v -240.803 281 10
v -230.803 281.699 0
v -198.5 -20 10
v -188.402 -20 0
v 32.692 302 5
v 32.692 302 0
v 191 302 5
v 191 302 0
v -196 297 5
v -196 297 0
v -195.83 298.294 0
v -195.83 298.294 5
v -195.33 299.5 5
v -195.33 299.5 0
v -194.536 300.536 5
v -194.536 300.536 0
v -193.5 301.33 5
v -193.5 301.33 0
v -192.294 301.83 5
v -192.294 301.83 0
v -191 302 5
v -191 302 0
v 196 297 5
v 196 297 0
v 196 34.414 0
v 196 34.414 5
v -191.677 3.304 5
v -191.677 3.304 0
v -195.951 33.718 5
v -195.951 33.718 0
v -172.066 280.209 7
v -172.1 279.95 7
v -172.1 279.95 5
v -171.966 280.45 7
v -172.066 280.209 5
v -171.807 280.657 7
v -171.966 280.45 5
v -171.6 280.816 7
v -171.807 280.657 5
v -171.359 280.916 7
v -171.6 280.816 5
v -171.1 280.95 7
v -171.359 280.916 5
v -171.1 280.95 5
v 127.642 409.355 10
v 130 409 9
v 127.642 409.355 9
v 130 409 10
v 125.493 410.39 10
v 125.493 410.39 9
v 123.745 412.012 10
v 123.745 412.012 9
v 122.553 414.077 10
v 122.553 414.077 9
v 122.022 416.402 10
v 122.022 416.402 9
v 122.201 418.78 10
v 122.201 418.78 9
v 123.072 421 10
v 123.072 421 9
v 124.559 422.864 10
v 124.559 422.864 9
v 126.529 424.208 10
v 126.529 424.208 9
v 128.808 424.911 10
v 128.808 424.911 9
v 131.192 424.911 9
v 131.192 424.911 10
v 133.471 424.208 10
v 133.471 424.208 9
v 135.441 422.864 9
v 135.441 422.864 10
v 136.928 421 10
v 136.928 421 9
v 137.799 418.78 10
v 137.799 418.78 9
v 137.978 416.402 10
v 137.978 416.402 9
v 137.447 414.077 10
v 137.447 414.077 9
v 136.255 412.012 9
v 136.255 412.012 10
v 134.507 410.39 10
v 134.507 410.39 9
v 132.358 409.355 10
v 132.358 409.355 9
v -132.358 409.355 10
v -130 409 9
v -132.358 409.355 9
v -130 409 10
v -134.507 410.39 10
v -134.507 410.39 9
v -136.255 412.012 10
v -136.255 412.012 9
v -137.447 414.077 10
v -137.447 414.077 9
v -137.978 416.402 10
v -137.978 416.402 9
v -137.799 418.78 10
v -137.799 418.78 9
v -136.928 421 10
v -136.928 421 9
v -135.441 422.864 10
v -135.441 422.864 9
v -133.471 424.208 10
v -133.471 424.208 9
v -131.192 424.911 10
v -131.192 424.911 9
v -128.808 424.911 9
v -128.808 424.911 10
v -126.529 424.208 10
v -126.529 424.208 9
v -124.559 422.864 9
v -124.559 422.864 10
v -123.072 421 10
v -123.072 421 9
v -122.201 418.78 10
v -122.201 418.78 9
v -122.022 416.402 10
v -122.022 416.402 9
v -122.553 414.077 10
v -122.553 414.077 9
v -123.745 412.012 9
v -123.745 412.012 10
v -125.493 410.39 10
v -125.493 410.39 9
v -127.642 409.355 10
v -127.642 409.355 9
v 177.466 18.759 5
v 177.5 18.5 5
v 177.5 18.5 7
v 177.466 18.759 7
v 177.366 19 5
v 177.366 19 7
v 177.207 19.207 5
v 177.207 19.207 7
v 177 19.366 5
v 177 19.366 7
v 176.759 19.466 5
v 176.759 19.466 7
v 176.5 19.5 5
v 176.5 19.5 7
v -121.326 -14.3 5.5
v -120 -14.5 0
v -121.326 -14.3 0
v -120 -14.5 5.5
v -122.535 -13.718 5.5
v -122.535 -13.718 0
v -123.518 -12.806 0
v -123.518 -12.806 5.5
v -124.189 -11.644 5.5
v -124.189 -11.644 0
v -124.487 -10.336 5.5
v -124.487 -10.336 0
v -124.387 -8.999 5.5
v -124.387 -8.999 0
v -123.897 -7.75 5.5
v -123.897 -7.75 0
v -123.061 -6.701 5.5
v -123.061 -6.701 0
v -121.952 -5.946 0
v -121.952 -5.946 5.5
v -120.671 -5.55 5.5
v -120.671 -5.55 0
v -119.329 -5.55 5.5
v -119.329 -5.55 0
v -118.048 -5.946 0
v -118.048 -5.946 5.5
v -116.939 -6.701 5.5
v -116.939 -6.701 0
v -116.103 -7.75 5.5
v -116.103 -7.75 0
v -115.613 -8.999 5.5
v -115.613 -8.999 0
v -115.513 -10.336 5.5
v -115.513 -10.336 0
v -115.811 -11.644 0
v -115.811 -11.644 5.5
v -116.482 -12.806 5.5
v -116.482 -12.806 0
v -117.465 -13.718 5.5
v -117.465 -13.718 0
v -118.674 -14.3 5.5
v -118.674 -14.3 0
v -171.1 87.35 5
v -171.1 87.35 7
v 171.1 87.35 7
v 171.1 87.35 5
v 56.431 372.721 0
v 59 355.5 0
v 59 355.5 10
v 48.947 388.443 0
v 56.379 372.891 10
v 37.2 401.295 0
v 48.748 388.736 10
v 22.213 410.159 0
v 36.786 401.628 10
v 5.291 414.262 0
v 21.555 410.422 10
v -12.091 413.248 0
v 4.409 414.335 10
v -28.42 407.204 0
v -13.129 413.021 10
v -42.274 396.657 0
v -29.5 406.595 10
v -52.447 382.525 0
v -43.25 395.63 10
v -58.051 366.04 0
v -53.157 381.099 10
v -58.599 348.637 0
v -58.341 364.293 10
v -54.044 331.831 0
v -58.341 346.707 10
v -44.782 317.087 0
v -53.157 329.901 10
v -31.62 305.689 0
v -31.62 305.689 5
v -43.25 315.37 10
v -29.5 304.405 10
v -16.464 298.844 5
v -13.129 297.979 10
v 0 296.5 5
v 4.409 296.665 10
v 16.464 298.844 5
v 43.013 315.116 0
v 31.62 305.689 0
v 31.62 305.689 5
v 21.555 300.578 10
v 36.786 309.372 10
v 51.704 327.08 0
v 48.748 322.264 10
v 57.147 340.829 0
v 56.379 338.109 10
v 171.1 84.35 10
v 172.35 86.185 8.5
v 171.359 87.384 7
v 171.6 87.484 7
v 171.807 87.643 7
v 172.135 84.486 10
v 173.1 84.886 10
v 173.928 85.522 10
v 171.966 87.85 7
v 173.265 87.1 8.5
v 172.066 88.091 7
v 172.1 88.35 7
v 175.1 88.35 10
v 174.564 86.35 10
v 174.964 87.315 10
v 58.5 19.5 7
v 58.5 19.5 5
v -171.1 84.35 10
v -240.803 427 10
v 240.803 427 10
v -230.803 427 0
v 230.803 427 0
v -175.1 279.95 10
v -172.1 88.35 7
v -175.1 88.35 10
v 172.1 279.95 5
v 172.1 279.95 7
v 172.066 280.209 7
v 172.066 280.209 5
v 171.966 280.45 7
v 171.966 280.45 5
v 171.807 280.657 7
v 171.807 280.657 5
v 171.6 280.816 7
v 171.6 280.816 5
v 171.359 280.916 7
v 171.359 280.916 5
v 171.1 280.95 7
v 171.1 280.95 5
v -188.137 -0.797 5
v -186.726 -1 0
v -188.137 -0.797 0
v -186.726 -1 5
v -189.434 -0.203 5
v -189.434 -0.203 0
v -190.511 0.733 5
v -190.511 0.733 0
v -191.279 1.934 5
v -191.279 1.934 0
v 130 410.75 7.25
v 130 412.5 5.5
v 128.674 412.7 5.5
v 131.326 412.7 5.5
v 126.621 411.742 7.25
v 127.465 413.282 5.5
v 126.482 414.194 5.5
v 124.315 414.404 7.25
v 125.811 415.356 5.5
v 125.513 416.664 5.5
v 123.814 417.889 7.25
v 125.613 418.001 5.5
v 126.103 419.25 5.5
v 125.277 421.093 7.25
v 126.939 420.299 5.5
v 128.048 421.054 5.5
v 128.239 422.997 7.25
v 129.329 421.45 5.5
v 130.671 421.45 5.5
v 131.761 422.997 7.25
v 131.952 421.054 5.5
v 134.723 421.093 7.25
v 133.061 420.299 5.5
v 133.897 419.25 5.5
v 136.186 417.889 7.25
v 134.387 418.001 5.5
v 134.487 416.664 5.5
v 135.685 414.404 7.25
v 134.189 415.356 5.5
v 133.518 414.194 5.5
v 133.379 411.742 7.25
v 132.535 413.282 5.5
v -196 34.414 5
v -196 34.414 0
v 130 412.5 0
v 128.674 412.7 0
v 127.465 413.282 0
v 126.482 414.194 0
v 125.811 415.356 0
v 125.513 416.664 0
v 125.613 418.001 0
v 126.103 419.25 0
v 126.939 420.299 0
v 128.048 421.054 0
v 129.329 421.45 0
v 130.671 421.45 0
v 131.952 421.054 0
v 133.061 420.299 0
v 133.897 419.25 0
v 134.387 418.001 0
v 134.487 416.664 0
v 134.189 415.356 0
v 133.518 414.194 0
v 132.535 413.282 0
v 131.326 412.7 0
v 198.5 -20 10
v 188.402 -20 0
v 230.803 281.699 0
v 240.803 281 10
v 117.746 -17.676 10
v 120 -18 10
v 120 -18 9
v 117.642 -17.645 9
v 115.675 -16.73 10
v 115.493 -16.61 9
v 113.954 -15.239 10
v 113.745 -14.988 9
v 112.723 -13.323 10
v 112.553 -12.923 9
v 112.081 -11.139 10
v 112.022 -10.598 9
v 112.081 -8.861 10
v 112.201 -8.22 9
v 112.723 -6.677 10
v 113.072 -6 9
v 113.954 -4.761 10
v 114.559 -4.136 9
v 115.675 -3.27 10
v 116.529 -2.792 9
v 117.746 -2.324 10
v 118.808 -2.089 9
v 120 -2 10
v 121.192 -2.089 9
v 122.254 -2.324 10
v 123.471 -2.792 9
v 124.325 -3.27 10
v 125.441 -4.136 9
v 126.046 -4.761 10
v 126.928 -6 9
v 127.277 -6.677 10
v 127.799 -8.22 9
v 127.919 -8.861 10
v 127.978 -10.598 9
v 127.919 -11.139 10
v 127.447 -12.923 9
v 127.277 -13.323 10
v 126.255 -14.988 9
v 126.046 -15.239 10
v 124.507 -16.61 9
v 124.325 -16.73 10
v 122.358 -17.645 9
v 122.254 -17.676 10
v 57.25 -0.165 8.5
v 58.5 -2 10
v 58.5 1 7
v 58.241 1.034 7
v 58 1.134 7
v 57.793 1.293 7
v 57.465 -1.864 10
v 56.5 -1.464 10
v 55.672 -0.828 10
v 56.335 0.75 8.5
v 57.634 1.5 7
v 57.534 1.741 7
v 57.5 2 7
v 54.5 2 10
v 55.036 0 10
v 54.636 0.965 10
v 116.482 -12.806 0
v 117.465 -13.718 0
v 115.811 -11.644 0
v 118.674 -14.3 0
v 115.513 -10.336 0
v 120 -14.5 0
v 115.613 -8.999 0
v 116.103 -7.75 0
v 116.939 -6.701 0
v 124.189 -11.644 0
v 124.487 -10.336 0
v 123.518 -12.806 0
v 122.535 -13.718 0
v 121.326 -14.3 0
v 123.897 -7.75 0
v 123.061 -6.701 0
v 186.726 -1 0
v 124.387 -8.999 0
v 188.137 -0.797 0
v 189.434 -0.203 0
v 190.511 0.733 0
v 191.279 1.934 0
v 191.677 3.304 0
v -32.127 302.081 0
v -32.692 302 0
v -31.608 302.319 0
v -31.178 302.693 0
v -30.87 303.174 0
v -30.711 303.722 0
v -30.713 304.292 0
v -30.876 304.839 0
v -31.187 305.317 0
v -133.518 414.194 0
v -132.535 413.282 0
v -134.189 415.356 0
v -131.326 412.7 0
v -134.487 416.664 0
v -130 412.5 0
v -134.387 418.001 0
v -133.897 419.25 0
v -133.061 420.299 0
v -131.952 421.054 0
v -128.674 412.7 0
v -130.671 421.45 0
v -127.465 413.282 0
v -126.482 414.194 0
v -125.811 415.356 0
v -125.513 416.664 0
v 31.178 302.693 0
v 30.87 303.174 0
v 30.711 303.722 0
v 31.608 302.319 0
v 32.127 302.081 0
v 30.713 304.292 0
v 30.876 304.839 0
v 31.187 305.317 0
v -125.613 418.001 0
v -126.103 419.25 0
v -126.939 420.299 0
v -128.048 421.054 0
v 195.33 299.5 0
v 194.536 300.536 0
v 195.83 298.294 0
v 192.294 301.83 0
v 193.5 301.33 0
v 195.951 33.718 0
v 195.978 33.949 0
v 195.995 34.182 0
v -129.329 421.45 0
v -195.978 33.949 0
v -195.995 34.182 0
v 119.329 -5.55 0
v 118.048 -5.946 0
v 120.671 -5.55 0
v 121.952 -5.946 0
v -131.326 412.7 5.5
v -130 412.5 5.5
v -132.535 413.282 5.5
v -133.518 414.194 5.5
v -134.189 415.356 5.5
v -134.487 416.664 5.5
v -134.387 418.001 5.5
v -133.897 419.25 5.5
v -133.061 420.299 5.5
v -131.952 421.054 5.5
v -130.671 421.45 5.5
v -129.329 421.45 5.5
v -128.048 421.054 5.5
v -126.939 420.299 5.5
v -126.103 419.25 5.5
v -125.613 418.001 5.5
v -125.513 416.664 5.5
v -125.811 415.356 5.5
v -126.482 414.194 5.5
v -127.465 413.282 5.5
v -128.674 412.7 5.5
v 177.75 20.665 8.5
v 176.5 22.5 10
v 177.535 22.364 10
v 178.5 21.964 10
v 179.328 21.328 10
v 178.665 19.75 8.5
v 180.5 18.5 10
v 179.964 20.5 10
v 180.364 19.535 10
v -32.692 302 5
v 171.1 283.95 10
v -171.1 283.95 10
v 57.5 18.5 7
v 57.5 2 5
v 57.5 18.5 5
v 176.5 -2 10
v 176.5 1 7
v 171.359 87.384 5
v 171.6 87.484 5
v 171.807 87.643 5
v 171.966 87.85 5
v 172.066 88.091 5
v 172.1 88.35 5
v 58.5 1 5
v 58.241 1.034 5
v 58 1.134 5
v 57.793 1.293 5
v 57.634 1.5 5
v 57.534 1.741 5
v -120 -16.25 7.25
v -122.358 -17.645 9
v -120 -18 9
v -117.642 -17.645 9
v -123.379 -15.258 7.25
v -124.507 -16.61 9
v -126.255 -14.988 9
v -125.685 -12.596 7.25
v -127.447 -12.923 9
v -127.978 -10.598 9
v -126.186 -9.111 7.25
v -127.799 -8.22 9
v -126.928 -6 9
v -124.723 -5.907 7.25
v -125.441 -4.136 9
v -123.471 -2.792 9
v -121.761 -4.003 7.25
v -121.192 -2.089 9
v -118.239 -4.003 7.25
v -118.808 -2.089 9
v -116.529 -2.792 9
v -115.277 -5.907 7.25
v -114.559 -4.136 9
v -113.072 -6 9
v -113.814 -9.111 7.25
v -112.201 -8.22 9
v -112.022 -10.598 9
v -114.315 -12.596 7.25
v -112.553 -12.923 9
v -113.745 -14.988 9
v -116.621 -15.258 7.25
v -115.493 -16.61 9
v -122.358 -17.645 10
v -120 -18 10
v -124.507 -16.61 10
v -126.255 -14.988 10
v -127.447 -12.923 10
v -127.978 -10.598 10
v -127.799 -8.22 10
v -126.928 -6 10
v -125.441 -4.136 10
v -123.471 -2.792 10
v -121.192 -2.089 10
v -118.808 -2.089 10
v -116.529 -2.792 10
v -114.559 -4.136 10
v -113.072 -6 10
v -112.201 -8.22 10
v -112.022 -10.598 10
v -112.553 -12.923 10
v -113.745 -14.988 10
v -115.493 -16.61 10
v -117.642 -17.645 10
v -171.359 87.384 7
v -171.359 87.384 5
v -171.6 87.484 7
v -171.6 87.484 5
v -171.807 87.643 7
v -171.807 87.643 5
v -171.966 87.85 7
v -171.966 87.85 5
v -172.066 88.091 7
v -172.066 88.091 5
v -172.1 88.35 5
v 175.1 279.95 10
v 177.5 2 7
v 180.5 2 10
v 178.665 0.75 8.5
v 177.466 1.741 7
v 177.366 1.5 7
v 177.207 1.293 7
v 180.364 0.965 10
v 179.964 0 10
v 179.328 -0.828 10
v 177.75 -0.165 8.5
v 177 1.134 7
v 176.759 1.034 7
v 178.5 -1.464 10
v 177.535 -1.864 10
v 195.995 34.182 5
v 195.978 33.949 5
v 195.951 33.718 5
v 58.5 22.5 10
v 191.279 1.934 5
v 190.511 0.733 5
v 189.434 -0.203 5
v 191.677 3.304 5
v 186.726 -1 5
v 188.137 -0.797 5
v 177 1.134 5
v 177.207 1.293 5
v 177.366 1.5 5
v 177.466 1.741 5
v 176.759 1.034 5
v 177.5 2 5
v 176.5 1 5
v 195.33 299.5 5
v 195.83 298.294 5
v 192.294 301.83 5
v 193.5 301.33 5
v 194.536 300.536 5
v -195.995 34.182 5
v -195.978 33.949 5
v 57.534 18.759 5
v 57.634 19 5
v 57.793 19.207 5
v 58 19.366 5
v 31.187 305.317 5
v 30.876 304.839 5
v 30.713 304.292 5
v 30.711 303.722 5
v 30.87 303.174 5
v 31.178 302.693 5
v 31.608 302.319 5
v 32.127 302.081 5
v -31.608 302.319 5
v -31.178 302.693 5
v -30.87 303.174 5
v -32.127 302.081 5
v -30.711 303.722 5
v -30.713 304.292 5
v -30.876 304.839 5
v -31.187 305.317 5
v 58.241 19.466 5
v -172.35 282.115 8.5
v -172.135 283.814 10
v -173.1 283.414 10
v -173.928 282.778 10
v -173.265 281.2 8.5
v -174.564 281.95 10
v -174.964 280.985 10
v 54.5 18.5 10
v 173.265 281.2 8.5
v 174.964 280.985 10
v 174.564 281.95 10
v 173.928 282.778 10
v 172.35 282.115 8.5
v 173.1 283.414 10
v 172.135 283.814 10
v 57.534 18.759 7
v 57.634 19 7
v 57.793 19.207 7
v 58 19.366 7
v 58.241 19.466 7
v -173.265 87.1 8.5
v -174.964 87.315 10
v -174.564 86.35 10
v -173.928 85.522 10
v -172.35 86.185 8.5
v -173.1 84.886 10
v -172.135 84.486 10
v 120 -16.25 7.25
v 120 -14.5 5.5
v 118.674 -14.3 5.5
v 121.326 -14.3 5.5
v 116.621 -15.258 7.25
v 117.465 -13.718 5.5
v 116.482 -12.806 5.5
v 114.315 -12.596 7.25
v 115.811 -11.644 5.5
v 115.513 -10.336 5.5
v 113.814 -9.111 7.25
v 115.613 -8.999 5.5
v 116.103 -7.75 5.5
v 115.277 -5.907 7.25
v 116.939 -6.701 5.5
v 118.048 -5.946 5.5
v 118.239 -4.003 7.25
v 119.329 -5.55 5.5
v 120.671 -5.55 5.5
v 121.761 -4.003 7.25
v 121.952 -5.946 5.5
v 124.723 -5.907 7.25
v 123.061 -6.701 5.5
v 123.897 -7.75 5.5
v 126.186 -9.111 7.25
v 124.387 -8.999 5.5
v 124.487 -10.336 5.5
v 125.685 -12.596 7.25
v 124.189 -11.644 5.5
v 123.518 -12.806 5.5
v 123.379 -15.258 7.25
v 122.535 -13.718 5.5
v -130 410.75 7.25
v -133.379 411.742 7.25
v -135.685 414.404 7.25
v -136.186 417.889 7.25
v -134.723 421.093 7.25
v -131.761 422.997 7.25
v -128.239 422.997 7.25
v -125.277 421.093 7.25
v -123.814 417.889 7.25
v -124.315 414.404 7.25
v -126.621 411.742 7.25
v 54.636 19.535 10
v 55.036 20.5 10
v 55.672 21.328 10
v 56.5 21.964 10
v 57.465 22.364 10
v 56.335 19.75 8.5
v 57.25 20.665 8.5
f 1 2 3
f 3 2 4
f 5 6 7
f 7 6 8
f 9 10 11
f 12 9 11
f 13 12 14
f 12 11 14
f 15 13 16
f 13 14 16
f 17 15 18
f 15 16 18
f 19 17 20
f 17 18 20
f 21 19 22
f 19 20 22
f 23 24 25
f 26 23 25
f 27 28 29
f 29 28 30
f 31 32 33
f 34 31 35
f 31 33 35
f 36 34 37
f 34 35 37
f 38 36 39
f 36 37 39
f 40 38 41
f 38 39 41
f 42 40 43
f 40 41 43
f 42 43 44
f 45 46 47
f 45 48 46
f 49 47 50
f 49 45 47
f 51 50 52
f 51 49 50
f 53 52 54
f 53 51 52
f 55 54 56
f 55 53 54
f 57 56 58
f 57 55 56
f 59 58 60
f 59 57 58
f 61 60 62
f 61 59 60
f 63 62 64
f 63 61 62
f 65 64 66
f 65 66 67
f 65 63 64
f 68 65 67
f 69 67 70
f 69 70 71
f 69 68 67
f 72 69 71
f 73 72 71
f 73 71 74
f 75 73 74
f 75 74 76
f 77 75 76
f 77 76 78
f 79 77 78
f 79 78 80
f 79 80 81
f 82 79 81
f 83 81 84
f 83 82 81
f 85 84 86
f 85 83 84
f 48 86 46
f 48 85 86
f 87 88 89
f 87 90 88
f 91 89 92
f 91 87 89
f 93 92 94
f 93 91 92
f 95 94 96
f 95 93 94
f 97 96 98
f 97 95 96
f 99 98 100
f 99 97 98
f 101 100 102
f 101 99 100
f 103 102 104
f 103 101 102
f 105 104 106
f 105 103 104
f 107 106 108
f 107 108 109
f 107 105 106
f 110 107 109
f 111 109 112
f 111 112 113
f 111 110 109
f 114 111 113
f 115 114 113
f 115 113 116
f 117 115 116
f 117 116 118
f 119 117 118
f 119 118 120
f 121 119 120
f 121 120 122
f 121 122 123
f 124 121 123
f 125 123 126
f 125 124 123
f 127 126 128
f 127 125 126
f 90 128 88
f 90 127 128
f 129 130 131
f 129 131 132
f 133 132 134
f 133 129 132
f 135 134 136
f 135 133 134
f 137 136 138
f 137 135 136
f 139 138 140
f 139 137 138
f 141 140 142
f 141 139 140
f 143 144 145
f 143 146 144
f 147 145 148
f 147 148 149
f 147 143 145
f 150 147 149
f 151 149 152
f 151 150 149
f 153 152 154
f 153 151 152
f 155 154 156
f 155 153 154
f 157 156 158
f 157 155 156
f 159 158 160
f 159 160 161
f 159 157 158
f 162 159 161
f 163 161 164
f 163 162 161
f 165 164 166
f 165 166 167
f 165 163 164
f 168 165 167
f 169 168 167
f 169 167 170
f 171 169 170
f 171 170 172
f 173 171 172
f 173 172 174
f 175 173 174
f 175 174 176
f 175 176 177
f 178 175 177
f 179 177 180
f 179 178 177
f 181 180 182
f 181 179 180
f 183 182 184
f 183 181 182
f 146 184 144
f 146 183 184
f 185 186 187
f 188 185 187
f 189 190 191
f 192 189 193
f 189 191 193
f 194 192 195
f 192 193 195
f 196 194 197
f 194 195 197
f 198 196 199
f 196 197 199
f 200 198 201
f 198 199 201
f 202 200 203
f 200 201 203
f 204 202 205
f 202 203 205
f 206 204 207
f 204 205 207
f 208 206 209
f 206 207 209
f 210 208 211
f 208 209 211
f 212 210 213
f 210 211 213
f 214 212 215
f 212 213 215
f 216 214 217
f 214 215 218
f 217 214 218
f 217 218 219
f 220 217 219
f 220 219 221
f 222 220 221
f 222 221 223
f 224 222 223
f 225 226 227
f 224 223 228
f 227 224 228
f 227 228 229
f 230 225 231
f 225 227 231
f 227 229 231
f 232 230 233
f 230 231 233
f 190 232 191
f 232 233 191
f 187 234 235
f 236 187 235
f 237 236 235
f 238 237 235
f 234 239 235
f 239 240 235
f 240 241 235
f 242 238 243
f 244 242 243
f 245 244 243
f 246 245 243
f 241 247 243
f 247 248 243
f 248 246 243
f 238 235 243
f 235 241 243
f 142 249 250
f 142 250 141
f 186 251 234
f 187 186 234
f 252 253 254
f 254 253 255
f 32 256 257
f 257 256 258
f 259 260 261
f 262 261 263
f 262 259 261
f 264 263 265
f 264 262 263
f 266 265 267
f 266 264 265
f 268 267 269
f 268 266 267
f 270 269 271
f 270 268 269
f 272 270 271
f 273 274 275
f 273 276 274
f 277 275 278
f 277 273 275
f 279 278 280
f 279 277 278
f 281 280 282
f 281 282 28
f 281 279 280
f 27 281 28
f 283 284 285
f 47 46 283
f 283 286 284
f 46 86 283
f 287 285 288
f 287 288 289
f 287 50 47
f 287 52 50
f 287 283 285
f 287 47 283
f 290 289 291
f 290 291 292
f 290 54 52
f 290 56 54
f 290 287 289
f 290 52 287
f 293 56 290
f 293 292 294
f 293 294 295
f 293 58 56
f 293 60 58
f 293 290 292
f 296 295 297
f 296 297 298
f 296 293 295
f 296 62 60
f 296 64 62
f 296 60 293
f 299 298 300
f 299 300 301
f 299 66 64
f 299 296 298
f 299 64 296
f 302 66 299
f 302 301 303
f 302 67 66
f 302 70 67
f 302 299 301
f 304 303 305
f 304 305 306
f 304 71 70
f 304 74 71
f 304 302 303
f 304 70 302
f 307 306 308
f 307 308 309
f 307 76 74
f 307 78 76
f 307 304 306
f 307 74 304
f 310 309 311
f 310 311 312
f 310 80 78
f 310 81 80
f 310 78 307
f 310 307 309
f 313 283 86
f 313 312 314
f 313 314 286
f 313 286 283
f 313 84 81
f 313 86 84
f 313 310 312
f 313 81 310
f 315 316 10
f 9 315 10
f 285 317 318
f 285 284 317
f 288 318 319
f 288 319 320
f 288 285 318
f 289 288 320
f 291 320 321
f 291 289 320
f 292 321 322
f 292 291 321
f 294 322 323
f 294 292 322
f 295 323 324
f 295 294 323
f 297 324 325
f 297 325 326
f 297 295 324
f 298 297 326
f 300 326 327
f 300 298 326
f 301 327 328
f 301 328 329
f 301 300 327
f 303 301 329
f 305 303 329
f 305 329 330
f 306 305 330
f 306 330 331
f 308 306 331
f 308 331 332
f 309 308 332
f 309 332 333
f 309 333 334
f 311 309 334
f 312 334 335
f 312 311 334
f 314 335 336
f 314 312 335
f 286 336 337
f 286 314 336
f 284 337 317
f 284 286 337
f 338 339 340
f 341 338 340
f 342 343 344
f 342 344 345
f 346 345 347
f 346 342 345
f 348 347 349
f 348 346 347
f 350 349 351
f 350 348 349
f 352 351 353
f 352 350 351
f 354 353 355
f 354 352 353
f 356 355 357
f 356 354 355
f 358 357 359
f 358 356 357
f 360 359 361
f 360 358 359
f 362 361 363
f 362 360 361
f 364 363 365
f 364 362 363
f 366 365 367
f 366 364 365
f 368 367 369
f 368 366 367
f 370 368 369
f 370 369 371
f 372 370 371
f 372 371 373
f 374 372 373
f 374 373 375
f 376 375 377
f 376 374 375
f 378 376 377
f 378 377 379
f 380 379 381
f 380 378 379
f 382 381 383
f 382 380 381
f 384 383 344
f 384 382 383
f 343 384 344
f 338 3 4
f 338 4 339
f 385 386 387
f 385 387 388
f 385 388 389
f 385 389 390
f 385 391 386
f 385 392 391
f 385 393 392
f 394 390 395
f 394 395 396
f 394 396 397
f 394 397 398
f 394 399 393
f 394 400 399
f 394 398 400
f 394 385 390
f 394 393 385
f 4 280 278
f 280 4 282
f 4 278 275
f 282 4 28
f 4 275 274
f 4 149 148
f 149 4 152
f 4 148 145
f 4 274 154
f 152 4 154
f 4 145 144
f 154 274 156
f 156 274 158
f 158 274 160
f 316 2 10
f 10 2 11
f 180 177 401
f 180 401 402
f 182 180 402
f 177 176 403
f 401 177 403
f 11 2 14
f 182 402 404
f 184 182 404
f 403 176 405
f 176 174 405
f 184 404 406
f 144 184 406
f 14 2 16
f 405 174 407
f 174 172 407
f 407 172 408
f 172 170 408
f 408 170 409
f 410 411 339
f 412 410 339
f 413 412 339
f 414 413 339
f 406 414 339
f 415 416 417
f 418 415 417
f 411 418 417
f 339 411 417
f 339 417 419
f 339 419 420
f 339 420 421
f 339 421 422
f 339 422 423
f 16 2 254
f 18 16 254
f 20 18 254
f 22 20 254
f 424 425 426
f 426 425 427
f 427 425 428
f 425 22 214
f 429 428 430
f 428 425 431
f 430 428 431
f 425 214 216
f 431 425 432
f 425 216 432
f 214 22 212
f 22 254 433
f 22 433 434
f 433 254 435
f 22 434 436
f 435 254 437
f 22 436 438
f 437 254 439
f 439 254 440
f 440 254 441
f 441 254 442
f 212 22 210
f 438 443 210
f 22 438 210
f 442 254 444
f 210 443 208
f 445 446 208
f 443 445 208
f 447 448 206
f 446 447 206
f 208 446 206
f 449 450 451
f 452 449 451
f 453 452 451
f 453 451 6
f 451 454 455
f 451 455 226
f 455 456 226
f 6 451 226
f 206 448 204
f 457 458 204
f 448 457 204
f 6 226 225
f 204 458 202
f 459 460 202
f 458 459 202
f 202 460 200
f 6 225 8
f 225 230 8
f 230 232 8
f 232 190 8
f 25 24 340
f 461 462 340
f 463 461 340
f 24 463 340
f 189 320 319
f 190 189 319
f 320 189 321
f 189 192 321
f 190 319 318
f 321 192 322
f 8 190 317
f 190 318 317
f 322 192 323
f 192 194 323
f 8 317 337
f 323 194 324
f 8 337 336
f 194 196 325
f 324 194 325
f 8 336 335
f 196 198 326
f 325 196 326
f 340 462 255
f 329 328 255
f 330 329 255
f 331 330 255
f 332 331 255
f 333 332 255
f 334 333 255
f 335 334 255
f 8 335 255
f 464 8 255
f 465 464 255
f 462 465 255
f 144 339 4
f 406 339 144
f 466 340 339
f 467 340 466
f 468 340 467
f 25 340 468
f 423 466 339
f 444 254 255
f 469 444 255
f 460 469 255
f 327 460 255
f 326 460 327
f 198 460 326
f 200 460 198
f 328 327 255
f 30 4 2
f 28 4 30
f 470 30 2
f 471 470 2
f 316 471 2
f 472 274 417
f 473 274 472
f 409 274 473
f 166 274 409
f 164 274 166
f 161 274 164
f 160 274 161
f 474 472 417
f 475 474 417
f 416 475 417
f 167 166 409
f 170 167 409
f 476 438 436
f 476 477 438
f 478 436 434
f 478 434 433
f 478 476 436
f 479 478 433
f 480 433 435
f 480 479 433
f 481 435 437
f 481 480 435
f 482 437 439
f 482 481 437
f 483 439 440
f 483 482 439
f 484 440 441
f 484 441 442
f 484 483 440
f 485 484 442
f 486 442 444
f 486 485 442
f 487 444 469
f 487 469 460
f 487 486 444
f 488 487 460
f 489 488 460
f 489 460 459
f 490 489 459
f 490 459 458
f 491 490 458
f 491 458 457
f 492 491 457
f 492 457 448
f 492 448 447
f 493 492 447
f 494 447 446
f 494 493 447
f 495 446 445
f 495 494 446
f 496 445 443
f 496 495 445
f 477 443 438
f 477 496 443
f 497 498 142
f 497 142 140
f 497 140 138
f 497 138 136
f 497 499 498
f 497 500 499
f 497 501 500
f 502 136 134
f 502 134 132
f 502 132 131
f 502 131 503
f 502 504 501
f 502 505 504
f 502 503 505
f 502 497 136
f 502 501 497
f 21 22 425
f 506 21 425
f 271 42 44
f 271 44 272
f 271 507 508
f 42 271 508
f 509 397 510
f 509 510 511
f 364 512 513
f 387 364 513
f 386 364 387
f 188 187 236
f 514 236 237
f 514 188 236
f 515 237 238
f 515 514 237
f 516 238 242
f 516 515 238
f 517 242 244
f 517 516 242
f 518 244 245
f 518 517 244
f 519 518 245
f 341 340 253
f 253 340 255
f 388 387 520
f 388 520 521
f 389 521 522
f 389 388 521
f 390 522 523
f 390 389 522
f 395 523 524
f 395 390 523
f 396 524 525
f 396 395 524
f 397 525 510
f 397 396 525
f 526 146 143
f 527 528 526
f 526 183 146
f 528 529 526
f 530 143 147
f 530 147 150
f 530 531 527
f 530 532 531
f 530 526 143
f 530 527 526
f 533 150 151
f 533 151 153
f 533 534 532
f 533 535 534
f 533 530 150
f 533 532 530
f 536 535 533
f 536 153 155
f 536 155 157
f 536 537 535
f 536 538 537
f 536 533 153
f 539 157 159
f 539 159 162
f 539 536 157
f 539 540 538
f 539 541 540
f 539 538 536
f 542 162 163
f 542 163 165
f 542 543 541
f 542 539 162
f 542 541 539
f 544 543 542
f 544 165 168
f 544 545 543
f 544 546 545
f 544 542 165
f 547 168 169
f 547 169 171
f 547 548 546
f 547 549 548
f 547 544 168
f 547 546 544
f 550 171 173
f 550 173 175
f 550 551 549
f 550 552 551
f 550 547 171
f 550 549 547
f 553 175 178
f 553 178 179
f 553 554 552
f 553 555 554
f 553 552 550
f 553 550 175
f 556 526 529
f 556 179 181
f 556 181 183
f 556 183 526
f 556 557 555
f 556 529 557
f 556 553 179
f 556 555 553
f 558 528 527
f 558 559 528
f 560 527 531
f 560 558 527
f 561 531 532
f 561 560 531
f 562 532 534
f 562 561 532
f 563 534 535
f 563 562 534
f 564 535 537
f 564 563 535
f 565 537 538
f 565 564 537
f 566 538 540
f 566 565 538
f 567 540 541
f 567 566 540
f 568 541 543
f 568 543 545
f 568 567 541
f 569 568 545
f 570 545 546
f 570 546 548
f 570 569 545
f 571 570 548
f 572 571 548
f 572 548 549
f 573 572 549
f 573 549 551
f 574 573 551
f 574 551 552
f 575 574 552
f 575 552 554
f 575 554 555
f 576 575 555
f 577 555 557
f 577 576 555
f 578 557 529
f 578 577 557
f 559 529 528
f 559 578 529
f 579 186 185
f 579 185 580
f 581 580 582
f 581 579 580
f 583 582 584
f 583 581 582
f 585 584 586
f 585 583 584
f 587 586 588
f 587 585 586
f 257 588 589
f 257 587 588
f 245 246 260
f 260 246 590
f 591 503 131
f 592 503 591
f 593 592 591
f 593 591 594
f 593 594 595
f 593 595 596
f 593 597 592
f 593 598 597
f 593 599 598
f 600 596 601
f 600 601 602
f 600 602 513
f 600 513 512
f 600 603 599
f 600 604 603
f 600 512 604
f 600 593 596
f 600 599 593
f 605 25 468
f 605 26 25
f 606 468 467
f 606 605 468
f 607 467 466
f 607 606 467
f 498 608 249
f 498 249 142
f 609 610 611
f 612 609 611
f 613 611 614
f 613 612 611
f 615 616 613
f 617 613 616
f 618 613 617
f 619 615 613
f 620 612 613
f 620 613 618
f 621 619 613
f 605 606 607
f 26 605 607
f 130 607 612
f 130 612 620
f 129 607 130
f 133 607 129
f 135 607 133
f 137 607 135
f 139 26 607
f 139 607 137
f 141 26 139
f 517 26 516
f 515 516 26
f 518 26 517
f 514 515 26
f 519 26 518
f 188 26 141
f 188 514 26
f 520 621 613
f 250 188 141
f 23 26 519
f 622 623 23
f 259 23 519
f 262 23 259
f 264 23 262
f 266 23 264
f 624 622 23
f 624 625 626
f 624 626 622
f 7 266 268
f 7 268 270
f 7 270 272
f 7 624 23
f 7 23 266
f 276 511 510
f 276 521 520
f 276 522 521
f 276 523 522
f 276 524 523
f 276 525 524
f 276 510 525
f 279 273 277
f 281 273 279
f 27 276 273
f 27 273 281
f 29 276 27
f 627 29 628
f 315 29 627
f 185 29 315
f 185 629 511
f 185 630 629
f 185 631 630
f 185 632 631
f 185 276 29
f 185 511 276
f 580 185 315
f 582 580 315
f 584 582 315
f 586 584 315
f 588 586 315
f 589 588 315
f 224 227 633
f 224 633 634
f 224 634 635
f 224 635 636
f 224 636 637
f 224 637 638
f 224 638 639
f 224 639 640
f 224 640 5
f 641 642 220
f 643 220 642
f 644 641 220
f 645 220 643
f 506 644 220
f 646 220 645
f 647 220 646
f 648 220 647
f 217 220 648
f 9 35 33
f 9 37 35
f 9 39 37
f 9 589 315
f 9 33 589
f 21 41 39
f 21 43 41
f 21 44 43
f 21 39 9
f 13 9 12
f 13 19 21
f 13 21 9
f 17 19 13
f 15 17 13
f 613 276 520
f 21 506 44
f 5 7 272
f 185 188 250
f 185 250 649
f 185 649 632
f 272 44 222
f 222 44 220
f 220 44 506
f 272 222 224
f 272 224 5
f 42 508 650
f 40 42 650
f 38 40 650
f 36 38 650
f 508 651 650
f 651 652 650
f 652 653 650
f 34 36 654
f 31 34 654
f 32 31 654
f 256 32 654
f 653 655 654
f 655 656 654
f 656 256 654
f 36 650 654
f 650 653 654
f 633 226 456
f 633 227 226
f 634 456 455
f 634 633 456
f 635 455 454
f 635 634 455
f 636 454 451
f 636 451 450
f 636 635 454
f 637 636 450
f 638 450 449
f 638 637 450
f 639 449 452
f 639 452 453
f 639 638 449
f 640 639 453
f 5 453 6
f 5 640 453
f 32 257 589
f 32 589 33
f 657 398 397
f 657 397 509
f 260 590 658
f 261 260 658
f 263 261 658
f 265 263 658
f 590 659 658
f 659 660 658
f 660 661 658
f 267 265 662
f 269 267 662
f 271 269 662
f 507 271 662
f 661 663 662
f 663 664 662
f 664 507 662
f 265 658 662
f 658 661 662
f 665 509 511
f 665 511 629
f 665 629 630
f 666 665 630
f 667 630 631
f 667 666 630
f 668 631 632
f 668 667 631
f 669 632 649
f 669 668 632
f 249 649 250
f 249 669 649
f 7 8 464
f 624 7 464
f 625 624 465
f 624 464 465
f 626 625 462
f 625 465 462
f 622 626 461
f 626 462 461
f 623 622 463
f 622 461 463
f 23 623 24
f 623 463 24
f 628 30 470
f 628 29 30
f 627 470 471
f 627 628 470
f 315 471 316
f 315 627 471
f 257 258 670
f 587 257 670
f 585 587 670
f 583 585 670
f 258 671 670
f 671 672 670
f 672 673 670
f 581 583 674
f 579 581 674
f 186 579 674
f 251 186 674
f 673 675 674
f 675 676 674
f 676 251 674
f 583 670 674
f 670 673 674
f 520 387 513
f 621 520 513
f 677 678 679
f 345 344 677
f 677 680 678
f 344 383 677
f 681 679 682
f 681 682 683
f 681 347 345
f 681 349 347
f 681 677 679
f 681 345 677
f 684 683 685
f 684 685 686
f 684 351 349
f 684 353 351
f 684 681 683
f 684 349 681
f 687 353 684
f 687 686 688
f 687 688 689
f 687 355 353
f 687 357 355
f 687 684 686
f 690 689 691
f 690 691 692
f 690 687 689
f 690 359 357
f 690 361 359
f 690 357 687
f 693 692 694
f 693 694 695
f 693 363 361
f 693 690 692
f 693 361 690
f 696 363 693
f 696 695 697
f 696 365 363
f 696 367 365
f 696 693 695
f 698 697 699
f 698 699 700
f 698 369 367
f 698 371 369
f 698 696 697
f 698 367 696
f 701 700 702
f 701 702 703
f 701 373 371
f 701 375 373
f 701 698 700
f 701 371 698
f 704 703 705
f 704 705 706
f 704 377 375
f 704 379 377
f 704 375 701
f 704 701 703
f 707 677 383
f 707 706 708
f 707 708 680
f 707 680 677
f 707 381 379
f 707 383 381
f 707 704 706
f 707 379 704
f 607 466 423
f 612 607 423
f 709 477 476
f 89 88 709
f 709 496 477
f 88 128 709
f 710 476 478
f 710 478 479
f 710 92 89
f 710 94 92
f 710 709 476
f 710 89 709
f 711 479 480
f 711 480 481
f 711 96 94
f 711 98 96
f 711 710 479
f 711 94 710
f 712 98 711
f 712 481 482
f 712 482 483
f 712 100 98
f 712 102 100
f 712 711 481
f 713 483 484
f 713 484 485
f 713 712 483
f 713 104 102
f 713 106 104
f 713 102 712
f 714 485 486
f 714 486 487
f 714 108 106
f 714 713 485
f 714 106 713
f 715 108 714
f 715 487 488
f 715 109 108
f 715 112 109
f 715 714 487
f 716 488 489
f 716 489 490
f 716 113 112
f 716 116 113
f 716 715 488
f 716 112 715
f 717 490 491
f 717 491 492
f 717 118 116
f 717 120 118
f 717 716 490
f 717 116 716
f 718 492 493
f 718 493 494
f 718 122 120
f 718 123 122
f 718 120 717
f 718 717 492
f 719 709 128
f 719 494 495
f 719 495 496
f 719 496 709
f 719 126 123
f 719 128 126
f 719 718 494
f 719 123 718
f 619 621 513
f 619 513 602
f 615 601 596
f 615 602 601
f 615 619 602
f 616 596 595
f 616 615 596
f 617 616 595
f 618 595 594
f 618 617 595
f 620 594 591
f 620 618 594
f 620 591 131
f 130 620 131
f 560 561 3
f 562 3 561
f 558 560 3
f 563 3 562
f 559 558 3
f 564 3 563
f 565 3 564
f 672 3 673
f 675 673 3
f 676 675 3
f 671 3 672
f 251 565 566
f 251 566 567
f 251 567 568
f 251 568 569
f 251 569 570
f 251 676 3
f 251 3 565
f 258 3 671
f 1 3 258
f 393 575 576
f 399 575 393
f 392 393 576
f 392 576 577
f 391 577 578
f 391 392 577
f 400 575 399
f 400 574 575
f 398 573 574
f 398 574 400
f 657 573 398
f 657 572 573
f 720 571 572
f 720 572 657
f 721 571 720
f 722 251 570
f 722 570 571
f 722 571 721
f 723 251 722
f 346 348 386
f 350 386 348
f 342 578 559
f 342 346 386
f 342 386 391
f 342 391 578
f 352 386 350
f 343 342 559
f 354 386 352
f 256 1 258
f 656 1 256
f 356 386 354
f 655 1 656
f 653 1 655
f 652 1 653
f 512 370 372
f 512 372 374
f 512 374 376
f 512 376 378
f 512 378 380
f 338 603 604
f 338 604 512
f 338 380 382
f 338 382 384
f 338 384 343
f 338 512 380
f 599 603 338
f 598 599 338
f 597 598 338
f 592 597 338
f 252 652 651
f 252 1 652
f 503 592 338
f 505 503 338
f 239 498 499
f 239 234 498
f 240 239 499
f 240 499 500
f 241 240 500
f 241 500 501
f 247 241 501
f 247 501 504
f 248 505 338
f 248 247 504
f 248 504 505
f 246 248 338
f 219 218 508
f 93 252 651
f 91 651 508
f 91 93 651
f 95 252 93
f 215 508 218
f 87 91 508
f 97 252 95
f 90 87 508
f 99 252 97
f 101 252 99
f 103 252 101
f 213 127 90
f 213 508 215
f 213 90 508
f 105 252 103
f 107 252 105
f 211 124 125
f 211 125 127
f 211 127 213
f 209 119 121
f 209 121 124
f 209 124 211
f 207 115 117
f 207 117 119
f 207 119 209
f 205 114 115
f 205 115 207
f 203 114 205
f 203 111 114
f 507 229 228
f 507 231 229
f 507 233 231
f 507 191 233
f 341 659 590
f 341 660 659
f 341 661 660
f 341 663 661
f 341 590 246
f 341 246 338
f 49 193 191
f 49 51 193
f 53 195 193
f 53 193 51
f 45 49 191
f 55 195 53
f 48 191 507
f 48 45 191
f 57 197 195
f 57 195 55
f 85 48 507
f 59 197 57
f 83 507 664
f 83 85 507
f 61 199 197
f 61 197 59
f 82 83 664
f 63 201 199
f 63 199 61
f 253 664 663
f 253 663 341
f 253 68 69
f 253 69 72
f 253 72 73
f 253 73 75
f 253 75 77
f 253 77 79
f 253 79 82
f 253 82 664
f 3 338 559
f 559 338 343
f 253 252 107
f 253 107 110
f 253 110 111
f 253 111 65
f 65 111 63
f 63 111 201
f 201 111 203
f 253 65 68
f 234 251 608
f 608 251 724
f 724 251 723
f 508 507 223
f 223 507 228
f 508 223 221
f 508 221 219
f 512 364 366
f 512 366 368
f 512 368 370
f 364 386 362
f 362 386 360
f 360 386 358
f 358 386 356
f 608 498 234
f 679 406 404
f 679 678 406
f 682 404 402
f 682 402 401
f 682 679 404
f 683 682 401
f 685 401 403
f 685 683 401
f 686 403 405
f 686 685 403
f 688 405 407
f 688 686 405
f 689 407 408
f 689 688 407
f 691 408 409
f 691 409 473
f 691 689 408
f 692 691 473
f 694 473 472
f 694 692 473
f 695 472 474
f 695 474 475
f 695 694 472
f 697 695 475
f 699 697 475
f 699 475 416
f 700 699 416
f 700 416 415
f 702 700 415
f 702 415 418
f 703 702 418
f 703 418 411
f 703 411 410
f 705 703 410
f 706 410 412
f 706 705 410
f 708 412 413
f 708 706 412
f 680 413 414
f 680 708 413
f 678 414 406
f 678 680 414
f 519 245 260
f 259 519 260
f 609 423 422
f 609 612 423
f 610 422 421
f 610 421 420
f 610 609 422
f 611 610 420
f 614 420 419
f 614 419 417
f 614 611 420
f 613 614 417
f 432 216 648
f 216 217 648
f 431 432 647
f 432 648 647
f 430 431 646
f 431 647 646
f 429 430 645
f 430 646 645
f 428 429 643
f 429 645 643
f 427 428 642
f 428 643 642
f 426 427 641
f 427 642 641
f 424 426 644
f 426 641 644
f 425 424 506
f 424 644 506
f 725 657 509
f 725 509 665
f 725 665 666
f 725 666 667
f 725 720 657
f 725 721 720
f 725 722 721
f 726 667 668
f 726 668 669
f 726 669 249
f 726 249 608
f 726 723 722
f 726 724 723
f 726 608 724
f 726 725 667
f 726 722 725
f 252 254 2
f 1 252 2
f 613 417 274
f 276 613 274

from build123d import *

# Parameters (mm, degrees)
SKETCH1_R                                    = 40
SKETCH1_W                                    = 120
SKETCH1_H                                    = 18.5
SKETCH1_W_2                                  = 344.2
SKETCH1_H_2                                  = 193.6
BOSS_EXTRUDE1_DEPTH                          = 5
CUT_EXTRUDE1_DEPTH                           = 5
SKETCH3_R                                    = 59
CUT_EXTRUDE2_DEPTH                           = 491.321307177
FILLET1_R                                    = 1
FILLET2_R                                    = 2
CHAMFER1_SIZE                                = 3
CHAMFER2_SIZE                                = 10
CSK_FOR_M8_HEX_SOCKET_COUNTERSUNK_HE_2_COUNT = 2
CSK_FOR_M8_HEX_SOCKET_COUNTERSUNK_HE_2_PITCH = 260
CSK_FOR_M8_HEX_SOCKET_COUNTERSUNK_HE_3_COUNT = 2
CSK_FOR_M8_HEX_SOCKET_COUNTERSUNK_HE_3_PITCH = 494.801980594
CSK_FOR_M8_HEX_SOCKET_COUNTERSUNK_HE_4_COUNT = 2
CSK_FOR_M8_HEX_SOCKET_COUNTERSUNK_HE_4_PITCH = 427.117079968
FILLET3_R                                    = 5


with BuildPart() as part:
    # Sketch1 → Boss-Extrude1 (new, symmetric)
    with BuildSketch(Plane.XY.offset(5)):
        Polygon((-198.5, -20), (198.5, -20), (240.802791245, 281), (240.802791245, 427), (-240.802791245, 427), (-240.802791245, 281), align=None)
        with Locations((0, 355.5)):
            Circle(SKETCH1_R, mode=Mode.SUBTRACT)
        with Locations((117.5, 10.25)):
            Rectangle(SKETCH1_W, SKETCH1_H, mode=Mode.SUBTRACT)
        with Locations((0, 184.15)):
            Rectangle(SKETCH1_W_2, SKETCH1_H_2, mode=Mode.SUBTRACT)
    extrude(amount=BOSS_EXTRUDE1_DEPTH, both=True)

    # Sketch2 → Cut-Extrude1 (cut)
    with BuildSketch(Plane(origin=(0, 0, 0), x_dir=(-1, 0, 0), z_dir=(0, 0, -1))):
        with BuildLine():
            Line((196, 34.064541037), (196, 68.5))
            Line((196, 68.5), (196, 297))
            ThreePointArc((196, 297), (194.535533906, 300.535533906), (191, 302))
            Line((191, 302), (-191, 302))
            ThreePointArc((-191, 302), (-194.535533906, 300.535533906), (-196, 297))
            Line((-196, 297), (-196, 68.5))
            Line((-196, 68.5), (-196, 34.064541037))
            Line((-196, 34.064541037), (-191.072000134, -1))
            Line((-191.072000134, -1), (191.072000134, -1))
            Line((191.072000134, -1), (196, 34.064541037))
        make_face()
    extrude(amount=-CUT_EXTRUDE1_DEPTH, mode=Mode.SUBTRACT)

    # Sketch3 → Cut-Extrude2 (cut, through all)
    with BuildSketch(Plane.XY.offset(10)):
        with Locations((0, 355.5)):
            Circle(SKETCH3_R)
    extrude(amount=-CUT_EXTRUDE2_DEPTH, mode=Mode.SUBTRACT)

    # Fillet1
    fillet1_edges = [part.edges().sort_by_distance(p)[0] for p in [
        (177.5, 1, 7.5),
        (177.5, 19.5, 7.5),
        (57.5, 19.5, 7.5),
        (57.5, 1, 7.5),
        (-172.1, 280.95, 7.5),
        (-172.1, 87.35, 7.5),
        (172.1, 87.35, 7.5),
        (172.1, 280.95, 7.5),
    ]]
    fillet(fillet1_edges, radius=FILLET1_R)

    # Fillet2
    fillet2_edges = [part.edges().sort_by_distance(p)[0] for p in [
        (-24.874685928, 302, 2.5),
        (24.874685928, 302, 2.5),
    ]]
    fillet(fillet2_edges, radius=FILLET2_R)

    # Chamfer1
    chamfer1_edges = [part.edges().sort_by_distance(p)[0] for p in [
        (57.5, 10.25, 10),
        (117.5, 1, 10),
        (117.5, 19.5, 10),
        (177.5, 10.25, 10),
        (0, 87.35, 10),
        (172.1, 184.15, 10),
        (0, 280.95, 10),
        (-172.1, 184.15, 10),
        (57.792893219, 1.292893219, 10),
        (57.792893219, 19.207106781, 10),
        (177.207106781, 19.207106781, 10),
        (177.207106781, 1.292893219, 10),
        (171.807106781, 87.642893219, 10),
        (171.807106781, 280.657106781, 10),
        (-171.807106781, 280.657106781, 10),
        (-171.807106781, 87.642893219, 10),
    ]]
    chamfer(chamfer1_edges, length=CHAMFER1_SIZE)

    # Chamfer2
    chamfer2_edges = [part.edges().sort_by_distance(p)[0] for p in [
        (219.651395623, 130.5, 0),
        (240.802791245, 354, 0),
        (-219.651395623, 130.5, 0),
        (-240.802791245, 354, 0),
    ]]
    chamfer(chamfer2_edges, length=CHAMFER2_SIZE - 0.0001)  # a hair under: the kernel refuses the full size

    # Sketch5 → CSK for M8 Hex Socket Countersunk Head Screw1 (revolve, cut)
    with BuildSketch(Plane(origin=(-130, 417, 10), x_dir=(0, -1, 0), z_dir=(1, 0, 0))):
        Polygon((0, 0), (0, 10), (4.5, 10), (4.5, 4.5), (8, 1), (8, 0), align=None)
    csk_for_m8_hex_socket_countersunk_head_s = revolve(axis=Axis((-130, 417, 16.35), (0, 0, -1)), mode=Mode.SUBTRACT)

    # CSK for M8 Hex Socket Countersunk He 2: CSK for M8 Hex Socket Countersunk Head Screw1 ×2
    with Locations(*[(i * CSK_FOR_M8_HEX_SOCKET_COUNTERSUNK_HE_2_PITCH, 0, 0) for i in range(1, CSK_FOR_M8_HEX_SOCKET_COUNTERSUNK_HE_2_COUNT)]):
        add(csk_for_m8_hex_socket_countersunk_head_s, mode=Mode.SUBTRACT)

    # CSK for M8 Hex Socket Countersunk He 3: CSK for M8 Hex Socket Countersunk Head Screw1 ×2
    with Locations(*[Vector(0.5052526259085499, -0.8629714850518034, 0) * (i * CSK_FOR_M8_HEX_SOCKET_COUNTERSUNK_HE_3_PITCH) for i in range(1, CSK_FOR_M8_HEX_SOCKET_COUNTERSUNK_HE_3_COUNT)]):
        add(csk_for_m8_hex_socket_countersunk_head_s, mode=Mode.SUBTRACT)

    # CSK for M8 Hex Socket Countersunk He 4: CSK for M8 Hex Socket Countersunk Head Screw1 ×2
    with Locations(*[Vector(0.02341278414986336, -0.9997258831991657, 0) * (i * CSK_FOR_M8_HEX_SOCKET_COUNTERSUNK_HE_4_PITCH) for i in range(1, CSK_FOR_M8_HEX_SOCKET_COUNTERSUNK_HE_4_COUNT)]):
        add(csk_for_m8_hex_socket_countersunk_head_s, mode=Mode.SUBTRACT)

    # Fillet3
    fillet3_edges = [part.edges().sort_by_distance(p)[0] for p in [
        (-196, 34.064541037, 2.5),
        (-191.072000134, -1, 2.5),
        (191.072000134, -1, 2.5),
        (196, 34.064541037, 2.5),
    ]]
    fillet(fillet3_edges, radius=FILLET3_R)


solid = part.part
